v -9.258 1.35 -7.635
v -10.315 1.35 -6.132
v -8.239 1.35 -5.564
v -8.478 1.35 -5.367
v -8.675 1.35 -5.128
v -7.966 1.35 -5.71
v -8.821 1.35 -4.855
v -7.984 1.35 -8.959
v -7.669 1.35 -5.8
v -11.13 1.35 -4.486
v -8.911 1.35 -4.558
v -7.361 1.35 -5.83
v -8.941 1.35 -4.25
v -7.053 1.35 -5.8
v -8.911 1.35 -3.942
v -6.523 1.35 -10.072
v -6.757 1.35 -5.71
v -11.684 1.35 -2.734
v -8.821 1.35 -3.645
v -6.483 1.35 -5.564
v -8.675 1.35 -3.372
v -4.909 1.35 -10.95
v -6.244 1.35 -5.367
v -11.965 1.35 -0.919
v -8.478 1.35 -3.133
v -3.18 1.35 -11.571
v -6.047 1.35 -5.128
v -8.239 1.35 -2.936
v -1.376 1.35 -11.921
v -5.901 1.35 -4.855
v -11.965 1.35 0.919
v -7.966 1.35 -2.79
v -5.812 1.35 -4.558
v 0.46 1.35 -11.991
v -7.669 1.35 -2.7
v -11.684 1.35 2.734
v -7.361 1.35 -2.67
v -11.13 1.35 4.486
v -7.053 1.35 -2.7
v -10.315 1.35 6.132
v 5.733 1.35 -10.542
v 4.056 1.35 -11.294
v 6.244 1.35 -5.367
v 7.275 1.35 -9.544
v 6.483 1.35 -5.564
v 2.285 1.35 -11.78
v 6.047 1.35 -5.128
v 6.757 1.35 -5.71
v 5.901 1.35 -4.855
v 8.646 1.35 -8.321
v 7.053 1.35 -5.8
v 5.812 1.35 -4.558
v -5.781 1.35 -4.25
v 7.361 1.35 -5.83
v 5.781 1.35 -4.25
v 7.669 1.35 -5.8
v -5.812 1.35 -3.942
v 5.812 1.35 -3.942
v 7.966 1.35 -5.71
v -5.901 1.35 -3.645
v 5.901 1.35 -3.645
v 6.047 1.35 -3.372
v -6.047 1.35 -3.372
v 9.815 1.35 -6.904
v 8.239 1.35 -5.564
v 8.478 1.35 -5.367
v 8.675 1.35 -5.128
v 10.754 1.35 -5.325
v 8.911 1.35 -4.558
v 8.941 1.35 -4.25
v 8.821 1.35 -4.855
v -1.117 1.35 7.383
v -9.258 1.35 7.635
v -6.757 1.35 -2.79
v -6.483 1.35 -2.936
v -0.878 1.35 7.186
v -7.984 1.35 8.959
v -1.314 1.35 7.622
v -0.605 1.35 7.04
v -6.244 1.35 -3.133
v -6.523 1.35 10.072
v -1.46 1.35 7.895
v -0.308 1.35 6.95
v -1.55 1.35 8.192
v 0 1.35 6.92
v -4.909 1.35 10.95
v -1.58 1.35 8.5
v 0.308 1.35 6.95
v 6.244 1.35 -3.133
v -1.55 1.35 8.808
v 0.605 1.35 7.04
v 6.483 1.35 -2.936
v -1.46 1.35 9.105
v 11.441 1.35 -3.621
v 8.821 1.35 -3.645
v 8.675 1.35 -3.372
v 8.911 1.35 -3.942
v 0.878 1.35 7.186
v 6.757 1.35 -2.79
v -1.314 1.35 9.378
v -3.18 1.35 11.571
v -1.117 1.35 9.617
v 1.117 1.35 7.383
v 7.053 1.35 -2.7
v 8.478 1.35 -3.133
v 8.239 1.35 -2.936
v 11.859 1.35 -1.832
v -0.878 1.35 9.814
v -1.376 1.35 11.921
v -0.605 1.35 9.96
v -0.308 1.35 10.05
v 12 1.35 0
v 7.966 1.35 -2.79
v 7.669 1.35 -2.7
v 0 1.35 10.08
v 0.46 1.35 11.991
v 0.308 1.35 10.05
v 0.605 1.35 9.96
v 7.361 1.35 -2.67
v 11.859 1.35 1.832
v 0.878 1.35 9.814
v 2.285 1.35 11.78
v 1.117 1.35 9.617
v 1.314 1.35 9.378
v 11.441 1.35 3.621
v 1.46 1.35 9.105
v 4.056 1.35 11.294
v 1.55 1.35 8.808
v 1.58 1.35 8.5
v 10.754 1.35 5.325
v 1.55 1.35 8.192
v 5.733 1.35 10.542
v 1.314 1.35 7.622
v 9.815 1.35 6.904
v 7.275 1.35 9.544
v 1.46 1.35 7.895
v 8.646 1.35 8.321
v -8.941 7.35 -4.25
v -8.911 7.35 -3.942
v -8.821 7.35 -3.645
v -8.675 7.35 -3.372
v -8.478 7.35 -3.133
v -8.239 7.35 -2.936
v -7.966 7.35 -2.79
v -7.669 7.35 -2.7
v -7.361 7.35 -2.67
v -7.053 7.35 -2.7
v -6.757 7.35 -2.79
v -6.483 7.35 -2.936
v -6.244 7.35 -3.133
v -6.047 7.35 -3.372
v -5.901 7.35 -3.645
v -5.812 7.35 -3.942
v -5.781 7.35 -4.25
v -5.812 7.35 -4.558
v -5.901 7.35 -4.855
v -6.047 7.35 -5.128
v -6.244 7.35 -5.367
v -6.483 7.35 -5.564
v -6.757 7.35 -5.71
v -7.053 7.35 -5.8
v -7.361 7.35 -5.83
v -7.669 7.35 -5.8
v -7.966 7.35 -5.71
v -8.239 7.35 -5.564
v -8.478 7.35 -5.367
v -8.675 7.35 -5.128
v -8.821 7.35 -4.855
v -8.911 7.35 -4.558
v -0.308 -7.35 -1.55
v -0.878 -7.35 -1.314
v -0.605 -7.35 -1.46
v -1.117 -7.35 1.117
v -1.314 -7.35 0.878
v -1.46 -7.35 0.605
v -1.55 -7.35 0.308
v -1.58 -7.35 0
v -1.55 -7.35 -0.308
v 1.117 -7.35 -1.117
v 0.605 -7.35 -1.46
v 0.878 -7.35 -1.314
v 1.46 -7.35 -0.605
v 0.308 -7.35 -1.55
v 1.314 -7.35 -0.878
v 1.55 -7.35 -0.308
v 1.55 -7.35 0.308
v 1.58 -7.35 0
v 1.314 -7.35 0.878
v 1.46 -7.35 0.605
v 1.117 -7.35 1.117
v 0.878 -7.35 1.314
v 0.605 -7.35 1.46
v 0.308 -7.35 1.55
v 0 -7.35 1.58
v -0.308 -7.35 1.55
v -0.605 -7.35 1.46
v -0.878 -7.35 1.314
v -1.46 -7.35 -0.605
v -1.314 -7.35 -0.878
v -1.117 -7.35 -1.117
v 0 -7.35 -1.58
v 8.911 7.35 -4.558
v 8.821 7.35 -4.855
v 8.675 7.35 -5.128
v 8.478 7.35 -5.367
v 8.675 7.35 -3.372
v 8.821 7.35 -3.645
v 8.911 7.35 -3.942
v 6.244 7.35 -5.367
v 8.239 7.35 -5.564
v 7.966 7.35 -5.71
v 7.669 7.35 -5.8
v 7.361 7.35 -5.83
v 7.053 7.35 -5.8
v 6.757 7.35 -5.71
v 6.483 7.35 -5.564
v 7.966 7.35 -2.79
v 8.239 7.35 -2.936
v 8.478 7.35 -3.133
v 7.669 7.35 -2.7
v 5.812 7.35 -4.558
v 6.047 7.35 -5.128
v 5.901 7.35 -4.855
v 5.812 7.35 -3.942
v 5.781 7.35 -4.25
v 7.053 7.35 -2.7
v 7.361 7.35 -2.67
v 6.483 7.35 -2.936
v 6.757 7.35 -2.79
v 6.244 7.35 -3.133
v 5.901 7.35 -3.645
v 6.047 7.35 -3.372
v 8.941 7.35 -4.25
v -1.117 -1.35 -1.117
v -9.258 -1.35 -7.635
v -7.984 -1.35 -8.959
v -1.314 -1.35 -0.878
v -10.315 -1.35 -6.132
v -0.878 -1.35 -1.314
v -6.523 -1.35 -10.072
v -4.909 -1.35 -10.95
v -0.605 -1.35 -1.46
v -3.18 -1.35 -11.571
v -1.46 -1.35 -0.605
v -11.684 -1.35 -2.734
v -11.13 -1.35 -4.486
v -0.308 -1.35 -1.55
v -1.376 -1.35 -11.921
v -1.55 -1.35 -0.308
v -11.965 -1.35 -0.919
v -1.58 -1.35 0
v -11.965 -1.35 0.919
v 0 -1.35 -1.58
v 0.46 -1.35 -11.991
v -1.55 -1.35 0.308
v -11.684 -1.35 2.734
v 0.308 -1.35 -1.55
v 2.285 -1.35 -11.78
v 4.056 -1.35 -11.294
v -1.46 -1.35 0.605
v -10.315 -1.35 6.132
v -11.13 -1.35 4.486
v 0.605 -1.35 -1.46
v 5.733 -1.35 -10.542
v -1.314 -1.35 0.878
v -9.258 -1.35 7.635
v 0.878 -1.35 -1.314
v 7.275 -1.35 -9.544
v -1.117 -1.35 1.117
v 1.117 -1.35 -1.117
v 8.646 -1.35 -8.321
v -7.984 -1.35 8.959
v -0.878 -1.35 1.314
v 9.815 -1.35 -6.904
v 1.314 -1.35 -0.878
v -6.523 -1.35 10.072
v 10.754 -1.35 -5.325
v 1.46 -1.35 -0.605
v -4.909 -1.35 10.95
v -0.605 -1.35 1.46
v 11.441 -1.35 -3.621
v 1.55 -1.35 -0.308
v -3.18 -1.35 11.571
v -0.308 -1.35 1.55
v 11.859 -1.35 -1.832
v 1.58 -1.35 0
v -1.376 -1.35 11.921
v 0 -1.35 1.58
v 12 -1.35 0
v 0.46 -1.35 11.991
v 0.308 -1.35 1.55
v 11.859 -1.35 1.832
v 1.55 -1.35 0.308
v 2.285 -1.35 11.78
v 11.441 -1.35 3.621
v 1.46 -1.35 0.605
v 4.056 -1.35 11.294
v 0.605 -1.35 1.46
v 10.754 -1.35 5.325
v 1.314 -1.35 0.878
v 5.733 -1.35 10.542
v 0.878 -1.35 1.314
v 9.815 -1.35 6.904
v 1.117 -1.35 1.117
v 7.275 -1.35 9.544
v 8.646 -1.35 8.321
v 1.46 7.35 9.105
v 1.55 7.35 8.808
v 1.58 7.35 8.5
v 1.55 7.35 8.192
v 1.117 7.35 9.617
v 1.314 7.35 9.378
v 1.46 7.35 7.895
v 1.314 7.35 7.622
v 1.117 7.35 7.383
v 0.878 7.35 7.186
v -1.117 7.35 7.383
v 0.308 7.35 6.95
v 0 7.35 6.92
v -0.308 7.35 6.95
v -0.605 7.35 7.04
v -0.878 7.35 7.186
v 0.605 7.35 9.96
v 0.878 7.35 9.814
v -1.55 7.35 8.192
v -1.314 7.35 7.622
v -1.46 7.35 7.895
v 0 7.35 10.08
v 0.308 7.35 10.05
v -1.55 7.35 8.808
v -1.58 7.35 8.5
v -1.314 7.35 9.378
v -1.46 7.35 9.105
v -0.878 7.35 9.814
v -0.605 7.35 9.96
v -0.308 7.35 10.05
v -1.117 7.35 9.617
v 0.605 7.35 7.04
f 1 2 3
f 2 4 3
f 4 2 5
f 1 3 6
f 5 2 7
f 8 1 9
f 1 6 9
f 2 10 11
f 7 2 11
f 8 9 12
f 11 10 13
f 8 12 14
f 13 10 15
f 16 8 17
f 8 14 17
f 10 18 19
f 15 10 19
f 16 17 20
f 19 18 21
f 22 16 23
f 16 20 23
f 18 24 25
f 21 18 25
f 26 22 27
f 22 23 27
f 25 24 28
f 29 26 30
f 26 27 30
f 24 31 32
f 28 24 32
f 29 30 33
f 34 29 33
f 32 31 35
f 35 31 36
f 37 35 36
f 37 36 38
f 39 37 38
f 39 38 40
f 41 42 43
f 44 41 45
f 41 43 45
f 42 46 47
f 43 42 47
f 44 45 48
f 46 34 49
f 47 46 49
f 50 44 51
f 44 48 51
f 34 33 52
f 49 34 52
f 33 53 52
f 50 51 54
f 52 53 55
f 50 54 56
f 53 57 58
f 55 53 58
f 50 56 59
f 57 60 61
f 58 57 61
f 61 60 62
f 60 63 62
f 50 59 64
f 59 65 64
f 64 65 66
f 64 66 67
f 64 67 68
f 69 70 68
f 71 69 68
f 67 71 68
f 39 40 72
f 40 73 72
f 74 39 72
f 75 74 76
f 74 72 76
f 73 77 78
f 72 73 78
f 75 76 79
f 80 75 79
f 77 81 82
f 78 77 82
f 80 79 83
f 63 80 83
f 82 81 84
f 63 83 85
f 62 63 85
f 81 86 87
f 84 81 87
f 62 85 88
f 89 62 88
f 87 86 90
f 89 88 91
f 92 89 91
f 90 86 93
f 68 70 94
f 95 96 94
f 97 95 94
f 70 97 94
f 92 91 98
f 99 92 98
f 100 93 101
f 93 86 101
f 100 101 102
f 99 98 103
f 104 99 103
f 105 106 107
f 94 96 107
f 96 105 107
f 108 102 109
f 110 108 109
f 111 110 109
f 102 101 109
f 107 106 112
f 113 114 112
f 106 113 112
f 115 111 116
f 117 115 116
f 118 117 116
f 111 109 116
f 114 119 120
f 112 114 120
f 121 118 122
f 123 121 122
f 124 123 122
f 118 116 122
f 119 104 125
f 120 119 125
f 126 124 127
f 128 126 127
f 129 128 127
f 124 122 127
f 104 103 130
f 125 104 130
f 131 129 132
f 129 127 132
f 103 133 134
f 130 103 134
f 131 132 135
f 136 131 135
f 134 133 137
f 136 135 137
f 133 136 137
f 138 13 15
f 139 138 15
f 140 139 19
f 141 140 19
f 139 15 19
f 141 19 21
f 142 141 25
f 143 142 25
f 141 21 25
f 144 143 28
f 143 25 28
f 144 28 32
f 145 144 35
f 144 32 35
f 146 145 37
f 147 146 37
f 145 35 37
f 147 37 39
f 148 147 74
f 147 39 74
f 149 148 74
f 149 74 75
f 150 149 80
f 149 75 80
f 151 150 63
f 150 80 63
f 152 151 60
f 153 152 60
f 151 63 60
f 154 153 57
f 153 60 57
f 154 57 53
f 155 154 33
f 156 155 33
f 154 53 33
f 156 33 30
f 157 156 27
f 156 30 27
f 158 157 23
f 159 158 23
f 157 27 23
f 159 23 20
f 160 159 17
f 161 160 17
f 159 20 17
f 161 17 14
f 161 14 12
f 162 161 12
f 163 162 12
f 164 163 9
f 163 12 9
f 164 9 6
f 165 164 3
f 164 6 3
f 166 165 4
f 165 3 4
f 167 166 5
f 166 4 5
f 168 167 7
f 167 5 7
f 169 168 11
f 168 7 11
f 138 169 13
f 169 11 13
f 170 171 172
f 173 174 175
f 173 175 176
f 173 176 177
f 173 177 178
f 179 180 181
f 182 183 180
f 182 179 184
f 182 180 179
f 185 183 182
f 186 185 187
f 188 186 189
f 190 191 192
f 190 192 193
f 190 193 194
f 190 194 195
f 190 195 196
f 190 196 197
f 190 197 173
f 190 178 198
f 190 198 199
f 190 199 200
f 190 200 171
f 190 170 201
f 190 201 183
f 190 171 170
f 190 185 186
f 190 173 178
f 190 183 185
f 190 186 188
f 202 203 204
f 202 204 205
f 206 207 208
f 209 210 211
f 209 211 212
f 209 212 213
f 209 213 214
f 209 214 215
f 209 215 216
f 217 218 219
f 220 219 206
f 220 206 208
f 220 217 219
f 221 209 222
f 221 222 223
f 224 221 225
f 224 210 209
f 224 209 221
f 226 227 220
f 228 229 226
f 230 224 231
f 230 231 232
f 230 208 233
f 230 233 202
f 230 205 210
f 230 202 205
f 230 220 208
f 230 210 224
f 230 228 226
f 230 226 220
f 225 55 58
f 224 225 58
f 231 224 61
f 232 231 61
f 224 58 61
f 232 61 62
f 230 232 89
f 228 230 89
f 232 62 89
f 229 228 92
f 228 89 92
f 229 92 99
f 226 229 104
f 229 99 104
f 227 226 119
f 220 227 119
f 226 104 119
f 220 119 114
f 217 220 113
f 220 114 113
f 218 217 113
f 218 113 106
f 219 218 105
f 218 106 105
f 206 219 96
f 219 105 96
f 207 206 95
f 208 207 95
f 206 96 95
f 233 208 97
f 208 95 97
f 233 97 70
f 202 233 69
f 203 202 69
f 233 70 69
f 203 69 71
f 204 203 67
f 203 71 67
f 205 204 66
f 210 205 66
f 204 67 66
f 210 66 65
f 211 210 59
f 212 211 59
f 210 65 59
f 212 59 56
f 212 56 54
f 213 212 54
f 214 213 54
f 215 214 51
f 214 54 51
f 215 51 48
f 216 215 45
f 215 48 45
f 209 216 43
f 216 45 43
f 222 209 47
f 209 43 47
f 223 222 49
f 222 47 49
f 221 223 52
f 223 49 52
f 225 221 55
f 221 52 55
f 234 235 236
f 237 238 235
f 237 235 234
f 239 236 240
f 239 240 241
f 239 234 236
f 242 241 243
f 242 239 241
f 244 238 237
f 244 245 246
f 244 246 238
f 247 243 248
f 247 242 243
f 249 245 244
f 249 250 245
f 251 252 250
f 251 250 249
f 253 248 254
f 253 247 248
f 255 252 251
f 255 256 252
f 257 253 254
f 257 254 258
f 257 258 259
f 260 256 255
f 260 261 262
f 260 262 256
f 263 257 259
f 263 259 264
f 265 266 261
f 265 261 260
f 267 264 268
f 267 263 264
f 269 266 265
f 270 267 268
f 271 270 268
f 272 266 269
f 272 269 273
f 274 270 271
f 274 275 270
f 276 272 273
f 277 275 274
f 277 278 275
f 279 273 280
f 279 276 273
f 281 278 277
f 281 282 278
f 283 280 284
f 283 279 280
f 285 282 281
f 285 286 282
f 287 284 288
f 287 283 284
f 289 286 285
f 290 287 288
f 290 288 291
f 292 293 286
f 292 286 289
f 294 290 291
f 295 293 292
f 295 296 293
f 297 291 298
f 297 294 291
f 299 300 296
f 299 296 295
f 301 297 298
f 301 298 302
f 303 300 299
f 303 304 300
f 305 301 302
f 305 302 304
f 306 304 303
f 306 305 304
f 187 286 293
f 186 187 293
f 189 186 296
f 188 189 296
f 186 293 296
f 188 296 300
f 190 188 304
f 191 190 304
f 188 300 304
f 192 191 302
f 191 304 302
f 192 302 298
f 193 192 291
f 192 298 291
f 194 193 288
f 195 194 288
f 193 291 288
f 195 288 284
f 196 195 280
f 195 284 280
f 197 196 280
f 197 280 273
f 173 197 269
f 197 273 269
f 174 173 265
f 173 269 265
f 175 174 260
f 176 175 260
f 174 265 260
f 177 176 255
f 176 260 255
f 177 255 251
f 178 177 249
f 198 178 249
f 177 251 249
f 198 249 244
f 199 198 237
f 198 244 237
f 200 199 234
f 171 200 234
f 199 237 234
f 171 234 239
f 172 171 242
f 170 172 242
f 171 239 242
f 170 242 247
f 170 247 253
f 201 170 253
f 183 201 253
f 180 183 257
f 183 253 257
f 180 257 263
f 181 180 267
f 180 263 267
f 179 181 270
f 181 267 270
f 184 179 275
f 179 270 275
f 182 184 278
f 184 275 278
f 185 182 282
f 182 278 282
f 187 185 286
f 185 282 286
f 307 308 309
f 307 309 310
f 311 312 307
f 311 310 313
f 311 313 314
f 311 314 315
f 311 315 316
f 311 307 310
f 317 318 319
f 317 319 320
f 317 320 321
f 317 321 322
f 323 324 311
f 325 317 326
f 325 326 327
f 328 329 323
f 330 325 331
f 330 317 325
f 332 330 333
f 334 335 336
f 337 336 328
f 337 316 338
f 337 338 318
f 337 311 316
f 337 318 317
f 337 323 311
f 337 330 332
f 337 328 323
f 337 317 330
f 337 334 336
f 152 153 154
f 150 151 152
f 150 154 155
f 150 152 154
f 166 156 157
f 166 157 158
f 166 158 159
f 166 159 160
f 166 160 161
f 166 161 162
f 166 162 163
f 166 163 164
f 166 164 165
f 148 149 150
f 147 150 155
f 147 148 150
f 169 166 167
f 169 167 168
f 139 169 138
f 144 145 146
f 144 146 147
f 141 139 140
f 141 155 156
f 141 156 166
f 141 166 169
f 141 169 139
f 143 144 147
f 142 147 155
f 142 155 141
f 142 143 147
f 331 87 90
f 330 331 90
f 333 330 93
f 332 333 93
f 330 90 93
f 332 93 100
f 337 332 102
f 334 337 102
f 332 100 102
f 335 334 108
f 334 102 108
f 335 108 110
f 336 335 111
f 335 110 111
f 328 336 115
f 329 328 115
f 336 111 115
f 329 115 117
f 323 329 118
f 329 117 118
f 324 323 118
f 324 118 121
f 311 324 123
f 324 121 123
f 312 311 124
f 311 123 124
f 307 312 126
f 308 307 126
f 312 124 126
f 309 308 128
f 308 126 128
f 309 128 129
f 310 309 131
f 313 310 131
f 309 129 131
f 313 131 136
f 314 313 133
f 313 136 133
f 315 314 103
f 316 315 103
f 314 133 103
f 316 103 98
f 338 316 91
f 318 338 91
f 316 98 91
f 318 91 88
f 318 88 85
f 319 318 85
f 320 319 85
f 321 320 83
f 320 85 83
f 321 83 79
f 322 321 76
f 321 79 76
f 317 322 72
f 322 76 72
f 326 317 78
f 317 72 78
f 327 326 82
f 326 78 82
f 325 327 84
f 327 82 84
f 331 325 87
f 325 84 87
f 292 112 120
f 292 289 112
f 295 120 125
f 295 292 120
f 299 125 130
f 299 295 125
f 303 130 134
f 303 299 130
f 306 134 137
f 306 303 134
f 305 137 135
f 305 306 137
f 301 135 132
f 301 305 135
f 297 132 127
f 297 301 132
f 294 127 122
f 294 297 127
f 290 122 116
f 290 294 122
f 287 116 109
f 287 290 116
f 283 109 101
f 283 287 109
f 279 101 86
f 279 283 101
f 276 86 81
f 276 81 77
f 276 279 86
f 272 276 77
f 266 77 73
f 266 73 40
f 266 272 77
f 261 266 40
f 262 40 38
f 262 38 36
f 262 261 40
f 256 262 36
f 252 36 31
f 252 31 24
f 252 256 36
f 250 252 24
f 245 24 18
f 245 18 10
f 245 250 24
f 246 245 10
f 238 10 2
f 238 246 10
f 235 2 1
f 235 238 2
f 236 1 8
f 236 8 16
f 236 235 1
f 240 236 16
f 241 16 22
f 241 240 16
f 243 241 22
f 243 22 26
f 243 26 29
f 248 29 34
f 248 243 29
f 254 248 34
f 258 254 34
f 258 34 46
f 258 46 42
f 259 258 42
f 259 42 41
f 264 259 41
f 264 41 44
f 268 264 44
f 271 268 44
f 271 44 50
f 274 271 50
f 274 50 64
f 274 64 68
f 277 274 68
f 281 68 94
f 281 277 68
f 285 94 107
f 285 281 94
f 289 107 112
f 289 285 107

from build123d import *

# Parameters (mm, degrees)
F0_R     = 12
F1_DEPTH = 1.35
F2_R     = 1.58
F3_DEPTH = 6
F4_R     = 1.58
F5_DEPTH = 6


with BuildPart() as f1:
    # F0 (on Front) → F1 (new body, symmetric)
    with BuildSketch(Plane.XZ):
        Circle(F0_R)
    extrude(amount=F1_DEPTH, both=True)

    # F2 (on face) → F3 (join)
    with BuildSketch(Plane.XZ.offset(1.35)):
        Circle(F2_R)
    extrude(amount=F3_DEPTH)

    # F4 (on face) → F5 (join)
    with BuildSketch(Plane(origin=(0, 1.35, 0), x_dir=(-1, 0, 0), z_dir=(0, 1, 0))):
        with Locations((0, 8.5)):
            Circle(F4_R)
        with Locations((-7.3612159322, -4.25)):
            Circle(F4_R)
        with Locations((7.3612159322, -4.25)):
            Circle(F4_R)
    extrude(amount=F5_DEPTH)


solid = f1.part
